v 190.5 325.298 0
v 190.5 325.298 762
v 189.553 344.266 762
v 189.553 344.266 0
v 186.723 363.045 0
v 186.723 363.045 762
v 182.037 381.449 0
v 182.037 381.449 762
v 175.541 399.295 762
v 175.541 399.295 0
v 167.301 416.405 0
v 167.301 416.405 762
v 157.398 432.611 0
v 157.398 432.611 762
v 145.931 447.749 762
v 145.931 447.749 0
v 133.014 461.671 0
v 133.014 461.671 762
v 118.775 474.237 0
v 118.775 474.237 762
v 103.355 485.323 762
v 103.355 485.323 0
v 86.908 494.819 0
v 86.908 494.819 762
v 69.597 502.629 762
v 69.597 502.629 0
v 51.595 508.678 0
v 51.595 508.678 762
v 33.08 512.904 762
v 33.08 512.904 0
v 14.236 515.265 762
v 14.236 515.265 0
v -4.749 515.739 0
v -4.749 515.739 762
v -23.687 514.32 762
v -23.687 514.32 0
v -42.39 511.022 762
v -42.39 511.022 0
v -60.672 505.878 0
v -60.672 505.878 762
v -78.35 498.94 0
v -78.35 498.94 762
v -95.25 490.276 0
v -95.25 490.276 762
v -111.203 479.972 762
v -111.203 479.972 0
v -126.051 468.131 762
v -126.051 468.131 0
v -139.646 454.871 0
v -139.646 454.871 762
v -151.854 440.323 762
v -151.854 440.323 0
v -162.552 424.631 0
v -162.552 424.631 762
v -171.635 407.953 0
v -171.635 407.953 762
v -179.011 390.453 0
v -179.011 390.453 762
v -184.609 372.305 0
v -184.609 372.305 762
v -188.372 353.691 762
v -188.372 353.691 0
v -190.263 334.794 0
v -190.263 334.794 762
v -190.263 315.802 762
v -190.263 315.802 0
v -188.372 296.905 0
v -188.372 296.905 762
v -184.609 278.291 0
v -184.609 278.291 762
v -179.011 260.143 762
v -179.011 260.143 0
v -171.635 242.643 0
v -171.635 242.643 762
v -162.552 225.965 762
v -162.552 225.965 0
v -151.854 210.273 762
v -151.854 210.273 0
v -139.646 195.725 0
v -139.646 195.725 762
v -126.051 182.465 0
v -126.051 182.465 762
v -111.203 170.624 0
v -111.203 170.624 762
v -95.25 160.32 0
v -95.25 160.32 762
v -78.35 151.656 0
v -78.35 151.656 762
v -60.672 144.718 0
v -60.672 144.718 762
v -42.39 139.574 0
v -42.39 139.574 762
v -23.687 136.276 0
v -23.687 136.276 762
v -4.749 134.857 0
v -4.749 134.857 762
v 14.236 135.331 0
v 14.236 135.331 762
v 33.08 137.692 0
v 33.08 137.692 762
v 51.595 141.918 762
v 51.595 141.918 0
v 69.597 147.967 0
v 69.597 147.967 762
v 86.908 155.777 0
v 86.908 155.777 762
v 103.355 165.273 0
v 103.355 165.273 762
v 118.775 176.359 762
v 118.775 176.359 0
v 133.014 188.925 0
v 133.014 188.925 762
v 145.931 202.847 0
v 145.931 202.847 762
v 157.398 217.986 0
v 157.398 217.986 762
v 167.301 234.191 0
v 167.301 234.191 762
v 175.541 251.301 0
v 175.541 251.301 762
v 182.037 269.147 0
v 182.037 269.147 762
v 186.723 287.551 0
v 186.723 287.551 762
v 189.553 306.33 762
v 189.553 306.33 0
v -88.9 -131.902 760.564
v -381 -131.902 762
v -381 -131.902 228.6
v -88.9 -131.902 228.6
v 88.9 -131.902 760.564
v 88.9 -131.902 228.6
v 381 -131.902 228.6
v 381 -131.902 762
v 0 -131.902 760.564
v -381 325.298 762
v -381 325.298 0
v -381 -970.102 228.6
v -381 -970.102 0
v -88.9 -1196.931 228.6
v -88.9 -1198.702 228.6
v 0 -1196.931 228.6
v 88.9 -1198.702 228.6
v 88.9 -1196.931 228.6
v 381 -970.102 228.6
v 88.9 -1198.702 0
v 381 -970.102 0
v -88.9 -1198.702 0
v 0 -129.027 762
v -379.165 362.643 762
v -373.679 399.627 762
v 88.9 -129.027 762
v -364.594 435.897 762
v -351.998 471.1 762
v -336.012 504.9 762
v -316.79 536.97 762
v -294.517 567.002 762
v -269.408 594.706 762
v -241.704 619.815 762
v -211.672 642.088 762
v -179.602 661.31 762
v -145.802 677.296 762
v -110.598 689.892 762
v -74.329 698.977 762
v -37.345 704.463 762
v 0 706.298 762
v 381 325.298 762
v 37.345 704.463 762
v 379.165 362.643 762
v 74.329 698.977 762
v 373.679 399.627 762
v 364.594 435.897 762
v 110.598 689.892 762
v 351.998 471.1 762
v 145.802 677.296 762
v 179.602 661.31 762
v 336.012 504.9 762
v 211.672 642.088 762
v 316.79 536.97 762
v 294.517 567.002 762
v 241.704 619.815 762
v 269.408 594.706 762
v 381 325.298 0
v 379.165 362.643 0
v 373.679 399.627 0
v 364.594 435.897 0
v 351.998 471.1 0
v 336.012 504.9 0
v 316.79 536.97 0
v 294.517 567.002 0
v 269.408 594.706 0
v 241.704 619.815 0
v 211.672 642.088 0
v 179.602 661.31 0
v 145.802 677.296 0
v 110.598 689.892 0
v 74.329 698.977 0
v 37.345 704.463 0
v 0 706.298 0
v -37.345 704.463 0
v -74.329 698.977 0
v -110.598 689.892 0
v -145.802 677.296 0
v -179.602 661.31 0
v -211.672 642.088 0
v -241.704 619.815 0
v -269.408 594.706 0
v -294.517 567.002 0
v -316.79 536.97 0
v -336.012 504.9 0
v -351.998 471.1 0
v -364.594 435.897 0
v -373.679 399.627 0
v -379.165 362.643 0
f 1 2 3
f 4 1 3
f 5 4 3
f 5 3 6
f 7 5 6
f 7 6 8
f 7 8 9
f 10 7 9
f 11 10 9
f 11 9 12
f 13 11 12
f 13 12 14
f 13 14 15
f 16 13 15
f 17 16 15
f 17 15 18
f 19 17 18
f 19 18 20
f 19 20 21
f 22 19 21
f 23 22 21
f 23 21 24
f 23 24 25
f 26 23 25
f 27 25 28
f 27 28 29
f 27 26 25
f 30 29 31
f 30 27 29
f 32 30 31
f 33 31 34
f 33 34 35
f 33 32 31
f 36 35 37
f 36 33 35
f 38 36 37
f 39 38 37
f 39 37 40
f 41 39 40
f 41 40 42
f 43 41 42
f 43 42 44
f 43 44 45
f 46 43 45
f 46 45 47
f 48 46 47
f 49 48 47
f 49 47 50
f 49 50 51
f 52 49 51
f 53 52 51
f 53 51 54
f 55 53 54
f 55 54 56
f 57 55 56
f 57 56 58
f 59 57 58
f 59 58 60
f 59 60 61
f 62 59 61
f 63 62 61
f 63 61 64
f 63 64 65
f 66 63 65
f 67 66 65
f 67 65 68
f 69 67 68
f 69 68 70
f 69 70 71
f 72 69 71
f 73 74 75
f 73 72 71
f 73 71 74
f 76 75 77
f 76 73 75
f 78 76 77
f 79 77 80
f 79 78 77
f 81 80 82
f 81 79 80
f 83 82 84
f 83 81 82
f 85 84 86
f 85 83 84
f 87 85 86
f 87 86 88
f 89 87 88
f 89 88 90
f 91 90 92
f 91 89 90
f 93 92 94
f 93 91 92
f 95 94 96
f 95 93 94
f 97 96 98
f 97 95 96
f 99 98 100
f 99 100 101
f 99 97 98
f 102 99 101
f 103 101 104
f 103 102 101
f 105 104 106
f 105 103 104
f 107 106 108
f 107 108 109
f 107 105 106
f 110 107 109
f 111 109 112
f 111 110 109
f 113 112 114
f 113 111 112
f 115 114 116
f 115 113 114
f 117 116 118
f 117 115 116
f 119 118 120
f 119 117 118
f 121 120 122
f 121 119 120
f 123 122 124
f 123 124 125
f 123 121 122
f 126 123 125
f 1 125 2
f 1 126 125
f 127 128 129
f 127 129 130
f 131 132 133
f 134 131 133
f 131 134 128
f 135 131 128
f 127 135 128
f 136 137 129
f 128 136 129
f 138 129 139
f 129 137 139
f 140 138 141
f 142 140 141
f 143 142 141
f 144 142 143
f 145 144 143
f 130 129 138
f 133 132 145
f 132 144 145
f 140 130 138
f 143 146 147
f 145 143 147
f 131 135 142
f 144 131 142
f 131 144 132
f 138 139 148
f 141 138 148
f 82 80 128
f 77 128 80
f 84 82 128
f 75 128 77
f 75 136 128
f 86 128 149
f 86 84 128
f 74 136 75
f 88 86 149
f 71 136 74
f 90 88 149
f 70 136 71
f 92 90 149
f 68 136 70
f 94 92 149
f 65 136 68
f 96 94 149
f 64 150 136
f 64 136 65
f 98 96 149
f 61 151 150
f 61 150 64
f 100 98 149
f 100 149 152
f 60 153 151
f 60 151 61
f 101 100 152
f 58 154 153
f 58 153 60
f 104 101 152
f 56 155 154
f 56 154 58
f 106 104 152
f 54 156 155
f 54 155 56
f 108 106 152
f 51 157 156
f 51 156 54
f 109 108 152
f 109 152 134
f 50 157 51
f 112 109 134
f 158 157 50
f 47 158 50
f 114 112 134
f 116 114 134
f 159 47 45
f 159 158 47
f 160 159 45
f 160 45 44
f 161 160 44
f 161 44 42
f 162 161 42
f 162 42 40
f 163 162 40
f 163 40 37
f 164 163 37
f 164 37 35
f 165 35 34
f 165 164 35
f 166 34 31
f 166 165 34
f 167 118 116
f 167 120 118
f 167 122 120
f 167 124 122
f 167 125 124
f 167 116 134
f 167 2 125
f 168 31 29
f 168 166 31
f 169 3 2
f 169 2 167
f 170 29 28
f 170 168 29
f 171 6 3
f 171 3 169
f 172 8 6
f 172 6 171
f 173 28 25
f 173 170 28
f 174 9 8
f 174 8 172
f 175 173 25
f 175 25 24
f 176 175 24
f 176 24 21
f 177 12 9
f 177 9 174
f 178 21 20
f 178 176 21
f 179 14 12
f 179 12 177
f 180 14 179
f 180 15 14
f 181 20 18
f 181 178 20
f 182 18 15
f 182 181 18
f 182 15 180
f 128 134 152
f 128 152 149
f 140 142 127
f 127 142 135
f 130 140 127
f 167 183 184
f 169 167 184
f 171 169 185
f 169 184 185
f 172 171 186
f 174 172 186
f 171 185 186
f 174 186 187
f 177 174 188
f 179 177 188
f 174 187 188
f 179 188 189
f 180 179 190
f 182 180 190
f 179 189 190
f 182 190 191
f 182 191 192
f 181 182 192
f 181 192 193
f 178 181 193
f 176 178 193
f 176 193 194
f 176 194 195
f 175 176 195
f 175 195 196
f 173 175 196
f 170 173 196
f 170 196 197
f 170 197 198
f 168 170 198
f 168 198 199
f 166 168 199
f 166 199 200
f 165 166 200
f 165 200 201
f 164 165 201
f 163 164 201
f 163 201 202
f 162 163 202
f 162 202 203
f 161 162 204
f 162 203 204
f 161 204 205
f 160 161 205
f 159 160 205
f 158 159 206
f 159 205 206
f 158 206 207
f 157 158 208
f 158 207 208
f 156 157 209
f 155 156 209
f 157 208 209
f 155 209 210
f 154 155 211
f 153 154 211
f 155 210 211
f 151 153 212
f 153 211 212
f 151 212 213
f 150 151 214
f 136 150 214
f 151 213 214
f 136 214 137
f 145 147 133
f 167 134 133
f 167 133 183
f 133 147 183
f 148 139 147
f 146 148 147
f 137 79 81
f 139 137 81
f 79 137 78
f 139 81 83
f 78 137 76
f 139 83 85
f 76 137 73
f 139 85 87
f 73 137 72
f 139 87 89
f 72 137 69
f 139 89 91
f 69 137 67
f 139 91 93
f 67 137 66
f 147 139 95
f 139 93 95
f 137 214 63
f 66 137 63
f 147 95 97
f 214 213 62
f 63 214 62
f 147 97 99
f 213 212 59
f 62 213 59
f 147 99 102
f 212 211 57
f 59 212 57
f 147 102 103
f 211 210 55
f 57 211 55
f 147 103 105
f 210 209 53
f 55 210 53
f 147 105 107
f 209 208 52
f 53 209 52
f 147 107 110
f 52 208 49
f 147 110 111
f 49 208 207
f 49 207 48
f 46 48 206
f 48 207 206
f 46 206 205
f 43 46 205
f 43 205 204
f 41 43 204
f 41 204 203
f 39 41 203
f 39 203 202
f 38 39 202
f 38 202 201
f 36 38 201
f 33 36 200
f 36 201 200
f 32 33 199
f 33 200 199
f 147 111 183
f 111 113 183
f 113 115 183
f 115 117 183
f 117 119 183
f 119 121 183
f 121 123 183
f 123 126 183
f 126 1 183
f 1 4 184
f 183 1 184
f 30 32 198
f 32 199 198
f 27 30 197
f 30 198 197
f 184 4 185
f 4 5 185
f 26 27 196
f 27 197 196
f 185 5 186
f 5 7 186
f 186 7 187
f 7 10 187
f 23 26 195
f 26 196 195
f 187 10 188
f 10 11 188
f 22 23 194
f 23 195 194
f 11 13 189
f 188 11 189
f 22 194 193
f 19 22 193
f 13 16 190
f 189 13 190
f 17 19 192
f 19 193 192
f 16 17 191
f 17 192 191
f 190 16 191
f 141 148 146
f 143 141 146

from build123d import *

# Parameters (mm, degrees)
F0_R     = 190.5
F2_DEPTH = 762
F0_W     = 177.8
F0_H     = 1066.8
F3_DEPTH = 228.6
F4_DEPTH = 88.9
F5_DEPTH = 88.9


with BuildPart() as f2:
    # F0 (on Top) → F2 (new body)
    with BuildSketch(Plane.XY):
        with BuildLine():
            Line((88.9, -131.90195), (381, -131.90195))
            Line((381, -131.90195), (381, 325.29805))
            ThreePointArc((381, 325.29805), (0, 706.29805), (-381, 325.29805))
            Line((-381, 325.29805), (-381, -131.90195))
            Line((-381, -131.90195), (-88.9, -131.90195))
            Line((-88.9, -131.90195), (88.9, -131.90195))
        make_face()
        with Locations((0, 325.29805)):
            Circle(F0_R, mode=Mode.SUBTRACT)
    extrude(amount=F2_DEPTH)

    # F0 (on Top) → F3 (join)
    with BuildSketch(Plane.XY):
        Polygon((381, -970.10195), (381, -131.90195), (88.9, -131.90195), (88.9, -1198.70195), align=None)
        with BuildLine():
            Line((88.9, -131.90195), (381, -131.90195))
            Line((381, -131.90195), (381, 325.29805))
            ThreePointArc((381, 325.29805), (0, 706.29805), (-381, 325.29805))
            Line((-381, 325.29805), (-381, -131.90195))
            Line((-381, -131.90195), (-88.9, -131.90195))
            Line((-88.9, -131.90195), (88.9, -131.90195))
        make_face()
        with Locations((0, 325.29805)):
            Circle(F0_R, mode=Mode.SUBTRACT)
        with Locations((0, -665.30195)):
            Rectangle(F0_W, F0_H)
        Polygon((-88.9, -1198.70195), (-88.9, -131.90195), (-381, -131.90195), (-381, -970.10195), align=None)
    extrude(amount=F3_DEPTH)

    # F1 (on Right) → F4 (join)
    with BuildSketch(Plane.YZ):
        Polygon((-129.027212, 762), (-1196.931251, 228.6), (-977.461457, 228.6), (-129.027212, 228.6), align=None)
    extrude(amount=F4_DEPTH)

    # F4_face (on face) → F5 (join)
    with BuildSketch(Plane(origin=(0, -486.911717, 405.921372), x_dir=(0, 1, 0), z_dir=(-1, 0, 0))):
        Polygon((-710.019534, 177.321372), (355.009767, -354.642745), (355.009767, 177.321372), align=None)
    extrude(amount=F5_DEPTH)


solid = f2.part
